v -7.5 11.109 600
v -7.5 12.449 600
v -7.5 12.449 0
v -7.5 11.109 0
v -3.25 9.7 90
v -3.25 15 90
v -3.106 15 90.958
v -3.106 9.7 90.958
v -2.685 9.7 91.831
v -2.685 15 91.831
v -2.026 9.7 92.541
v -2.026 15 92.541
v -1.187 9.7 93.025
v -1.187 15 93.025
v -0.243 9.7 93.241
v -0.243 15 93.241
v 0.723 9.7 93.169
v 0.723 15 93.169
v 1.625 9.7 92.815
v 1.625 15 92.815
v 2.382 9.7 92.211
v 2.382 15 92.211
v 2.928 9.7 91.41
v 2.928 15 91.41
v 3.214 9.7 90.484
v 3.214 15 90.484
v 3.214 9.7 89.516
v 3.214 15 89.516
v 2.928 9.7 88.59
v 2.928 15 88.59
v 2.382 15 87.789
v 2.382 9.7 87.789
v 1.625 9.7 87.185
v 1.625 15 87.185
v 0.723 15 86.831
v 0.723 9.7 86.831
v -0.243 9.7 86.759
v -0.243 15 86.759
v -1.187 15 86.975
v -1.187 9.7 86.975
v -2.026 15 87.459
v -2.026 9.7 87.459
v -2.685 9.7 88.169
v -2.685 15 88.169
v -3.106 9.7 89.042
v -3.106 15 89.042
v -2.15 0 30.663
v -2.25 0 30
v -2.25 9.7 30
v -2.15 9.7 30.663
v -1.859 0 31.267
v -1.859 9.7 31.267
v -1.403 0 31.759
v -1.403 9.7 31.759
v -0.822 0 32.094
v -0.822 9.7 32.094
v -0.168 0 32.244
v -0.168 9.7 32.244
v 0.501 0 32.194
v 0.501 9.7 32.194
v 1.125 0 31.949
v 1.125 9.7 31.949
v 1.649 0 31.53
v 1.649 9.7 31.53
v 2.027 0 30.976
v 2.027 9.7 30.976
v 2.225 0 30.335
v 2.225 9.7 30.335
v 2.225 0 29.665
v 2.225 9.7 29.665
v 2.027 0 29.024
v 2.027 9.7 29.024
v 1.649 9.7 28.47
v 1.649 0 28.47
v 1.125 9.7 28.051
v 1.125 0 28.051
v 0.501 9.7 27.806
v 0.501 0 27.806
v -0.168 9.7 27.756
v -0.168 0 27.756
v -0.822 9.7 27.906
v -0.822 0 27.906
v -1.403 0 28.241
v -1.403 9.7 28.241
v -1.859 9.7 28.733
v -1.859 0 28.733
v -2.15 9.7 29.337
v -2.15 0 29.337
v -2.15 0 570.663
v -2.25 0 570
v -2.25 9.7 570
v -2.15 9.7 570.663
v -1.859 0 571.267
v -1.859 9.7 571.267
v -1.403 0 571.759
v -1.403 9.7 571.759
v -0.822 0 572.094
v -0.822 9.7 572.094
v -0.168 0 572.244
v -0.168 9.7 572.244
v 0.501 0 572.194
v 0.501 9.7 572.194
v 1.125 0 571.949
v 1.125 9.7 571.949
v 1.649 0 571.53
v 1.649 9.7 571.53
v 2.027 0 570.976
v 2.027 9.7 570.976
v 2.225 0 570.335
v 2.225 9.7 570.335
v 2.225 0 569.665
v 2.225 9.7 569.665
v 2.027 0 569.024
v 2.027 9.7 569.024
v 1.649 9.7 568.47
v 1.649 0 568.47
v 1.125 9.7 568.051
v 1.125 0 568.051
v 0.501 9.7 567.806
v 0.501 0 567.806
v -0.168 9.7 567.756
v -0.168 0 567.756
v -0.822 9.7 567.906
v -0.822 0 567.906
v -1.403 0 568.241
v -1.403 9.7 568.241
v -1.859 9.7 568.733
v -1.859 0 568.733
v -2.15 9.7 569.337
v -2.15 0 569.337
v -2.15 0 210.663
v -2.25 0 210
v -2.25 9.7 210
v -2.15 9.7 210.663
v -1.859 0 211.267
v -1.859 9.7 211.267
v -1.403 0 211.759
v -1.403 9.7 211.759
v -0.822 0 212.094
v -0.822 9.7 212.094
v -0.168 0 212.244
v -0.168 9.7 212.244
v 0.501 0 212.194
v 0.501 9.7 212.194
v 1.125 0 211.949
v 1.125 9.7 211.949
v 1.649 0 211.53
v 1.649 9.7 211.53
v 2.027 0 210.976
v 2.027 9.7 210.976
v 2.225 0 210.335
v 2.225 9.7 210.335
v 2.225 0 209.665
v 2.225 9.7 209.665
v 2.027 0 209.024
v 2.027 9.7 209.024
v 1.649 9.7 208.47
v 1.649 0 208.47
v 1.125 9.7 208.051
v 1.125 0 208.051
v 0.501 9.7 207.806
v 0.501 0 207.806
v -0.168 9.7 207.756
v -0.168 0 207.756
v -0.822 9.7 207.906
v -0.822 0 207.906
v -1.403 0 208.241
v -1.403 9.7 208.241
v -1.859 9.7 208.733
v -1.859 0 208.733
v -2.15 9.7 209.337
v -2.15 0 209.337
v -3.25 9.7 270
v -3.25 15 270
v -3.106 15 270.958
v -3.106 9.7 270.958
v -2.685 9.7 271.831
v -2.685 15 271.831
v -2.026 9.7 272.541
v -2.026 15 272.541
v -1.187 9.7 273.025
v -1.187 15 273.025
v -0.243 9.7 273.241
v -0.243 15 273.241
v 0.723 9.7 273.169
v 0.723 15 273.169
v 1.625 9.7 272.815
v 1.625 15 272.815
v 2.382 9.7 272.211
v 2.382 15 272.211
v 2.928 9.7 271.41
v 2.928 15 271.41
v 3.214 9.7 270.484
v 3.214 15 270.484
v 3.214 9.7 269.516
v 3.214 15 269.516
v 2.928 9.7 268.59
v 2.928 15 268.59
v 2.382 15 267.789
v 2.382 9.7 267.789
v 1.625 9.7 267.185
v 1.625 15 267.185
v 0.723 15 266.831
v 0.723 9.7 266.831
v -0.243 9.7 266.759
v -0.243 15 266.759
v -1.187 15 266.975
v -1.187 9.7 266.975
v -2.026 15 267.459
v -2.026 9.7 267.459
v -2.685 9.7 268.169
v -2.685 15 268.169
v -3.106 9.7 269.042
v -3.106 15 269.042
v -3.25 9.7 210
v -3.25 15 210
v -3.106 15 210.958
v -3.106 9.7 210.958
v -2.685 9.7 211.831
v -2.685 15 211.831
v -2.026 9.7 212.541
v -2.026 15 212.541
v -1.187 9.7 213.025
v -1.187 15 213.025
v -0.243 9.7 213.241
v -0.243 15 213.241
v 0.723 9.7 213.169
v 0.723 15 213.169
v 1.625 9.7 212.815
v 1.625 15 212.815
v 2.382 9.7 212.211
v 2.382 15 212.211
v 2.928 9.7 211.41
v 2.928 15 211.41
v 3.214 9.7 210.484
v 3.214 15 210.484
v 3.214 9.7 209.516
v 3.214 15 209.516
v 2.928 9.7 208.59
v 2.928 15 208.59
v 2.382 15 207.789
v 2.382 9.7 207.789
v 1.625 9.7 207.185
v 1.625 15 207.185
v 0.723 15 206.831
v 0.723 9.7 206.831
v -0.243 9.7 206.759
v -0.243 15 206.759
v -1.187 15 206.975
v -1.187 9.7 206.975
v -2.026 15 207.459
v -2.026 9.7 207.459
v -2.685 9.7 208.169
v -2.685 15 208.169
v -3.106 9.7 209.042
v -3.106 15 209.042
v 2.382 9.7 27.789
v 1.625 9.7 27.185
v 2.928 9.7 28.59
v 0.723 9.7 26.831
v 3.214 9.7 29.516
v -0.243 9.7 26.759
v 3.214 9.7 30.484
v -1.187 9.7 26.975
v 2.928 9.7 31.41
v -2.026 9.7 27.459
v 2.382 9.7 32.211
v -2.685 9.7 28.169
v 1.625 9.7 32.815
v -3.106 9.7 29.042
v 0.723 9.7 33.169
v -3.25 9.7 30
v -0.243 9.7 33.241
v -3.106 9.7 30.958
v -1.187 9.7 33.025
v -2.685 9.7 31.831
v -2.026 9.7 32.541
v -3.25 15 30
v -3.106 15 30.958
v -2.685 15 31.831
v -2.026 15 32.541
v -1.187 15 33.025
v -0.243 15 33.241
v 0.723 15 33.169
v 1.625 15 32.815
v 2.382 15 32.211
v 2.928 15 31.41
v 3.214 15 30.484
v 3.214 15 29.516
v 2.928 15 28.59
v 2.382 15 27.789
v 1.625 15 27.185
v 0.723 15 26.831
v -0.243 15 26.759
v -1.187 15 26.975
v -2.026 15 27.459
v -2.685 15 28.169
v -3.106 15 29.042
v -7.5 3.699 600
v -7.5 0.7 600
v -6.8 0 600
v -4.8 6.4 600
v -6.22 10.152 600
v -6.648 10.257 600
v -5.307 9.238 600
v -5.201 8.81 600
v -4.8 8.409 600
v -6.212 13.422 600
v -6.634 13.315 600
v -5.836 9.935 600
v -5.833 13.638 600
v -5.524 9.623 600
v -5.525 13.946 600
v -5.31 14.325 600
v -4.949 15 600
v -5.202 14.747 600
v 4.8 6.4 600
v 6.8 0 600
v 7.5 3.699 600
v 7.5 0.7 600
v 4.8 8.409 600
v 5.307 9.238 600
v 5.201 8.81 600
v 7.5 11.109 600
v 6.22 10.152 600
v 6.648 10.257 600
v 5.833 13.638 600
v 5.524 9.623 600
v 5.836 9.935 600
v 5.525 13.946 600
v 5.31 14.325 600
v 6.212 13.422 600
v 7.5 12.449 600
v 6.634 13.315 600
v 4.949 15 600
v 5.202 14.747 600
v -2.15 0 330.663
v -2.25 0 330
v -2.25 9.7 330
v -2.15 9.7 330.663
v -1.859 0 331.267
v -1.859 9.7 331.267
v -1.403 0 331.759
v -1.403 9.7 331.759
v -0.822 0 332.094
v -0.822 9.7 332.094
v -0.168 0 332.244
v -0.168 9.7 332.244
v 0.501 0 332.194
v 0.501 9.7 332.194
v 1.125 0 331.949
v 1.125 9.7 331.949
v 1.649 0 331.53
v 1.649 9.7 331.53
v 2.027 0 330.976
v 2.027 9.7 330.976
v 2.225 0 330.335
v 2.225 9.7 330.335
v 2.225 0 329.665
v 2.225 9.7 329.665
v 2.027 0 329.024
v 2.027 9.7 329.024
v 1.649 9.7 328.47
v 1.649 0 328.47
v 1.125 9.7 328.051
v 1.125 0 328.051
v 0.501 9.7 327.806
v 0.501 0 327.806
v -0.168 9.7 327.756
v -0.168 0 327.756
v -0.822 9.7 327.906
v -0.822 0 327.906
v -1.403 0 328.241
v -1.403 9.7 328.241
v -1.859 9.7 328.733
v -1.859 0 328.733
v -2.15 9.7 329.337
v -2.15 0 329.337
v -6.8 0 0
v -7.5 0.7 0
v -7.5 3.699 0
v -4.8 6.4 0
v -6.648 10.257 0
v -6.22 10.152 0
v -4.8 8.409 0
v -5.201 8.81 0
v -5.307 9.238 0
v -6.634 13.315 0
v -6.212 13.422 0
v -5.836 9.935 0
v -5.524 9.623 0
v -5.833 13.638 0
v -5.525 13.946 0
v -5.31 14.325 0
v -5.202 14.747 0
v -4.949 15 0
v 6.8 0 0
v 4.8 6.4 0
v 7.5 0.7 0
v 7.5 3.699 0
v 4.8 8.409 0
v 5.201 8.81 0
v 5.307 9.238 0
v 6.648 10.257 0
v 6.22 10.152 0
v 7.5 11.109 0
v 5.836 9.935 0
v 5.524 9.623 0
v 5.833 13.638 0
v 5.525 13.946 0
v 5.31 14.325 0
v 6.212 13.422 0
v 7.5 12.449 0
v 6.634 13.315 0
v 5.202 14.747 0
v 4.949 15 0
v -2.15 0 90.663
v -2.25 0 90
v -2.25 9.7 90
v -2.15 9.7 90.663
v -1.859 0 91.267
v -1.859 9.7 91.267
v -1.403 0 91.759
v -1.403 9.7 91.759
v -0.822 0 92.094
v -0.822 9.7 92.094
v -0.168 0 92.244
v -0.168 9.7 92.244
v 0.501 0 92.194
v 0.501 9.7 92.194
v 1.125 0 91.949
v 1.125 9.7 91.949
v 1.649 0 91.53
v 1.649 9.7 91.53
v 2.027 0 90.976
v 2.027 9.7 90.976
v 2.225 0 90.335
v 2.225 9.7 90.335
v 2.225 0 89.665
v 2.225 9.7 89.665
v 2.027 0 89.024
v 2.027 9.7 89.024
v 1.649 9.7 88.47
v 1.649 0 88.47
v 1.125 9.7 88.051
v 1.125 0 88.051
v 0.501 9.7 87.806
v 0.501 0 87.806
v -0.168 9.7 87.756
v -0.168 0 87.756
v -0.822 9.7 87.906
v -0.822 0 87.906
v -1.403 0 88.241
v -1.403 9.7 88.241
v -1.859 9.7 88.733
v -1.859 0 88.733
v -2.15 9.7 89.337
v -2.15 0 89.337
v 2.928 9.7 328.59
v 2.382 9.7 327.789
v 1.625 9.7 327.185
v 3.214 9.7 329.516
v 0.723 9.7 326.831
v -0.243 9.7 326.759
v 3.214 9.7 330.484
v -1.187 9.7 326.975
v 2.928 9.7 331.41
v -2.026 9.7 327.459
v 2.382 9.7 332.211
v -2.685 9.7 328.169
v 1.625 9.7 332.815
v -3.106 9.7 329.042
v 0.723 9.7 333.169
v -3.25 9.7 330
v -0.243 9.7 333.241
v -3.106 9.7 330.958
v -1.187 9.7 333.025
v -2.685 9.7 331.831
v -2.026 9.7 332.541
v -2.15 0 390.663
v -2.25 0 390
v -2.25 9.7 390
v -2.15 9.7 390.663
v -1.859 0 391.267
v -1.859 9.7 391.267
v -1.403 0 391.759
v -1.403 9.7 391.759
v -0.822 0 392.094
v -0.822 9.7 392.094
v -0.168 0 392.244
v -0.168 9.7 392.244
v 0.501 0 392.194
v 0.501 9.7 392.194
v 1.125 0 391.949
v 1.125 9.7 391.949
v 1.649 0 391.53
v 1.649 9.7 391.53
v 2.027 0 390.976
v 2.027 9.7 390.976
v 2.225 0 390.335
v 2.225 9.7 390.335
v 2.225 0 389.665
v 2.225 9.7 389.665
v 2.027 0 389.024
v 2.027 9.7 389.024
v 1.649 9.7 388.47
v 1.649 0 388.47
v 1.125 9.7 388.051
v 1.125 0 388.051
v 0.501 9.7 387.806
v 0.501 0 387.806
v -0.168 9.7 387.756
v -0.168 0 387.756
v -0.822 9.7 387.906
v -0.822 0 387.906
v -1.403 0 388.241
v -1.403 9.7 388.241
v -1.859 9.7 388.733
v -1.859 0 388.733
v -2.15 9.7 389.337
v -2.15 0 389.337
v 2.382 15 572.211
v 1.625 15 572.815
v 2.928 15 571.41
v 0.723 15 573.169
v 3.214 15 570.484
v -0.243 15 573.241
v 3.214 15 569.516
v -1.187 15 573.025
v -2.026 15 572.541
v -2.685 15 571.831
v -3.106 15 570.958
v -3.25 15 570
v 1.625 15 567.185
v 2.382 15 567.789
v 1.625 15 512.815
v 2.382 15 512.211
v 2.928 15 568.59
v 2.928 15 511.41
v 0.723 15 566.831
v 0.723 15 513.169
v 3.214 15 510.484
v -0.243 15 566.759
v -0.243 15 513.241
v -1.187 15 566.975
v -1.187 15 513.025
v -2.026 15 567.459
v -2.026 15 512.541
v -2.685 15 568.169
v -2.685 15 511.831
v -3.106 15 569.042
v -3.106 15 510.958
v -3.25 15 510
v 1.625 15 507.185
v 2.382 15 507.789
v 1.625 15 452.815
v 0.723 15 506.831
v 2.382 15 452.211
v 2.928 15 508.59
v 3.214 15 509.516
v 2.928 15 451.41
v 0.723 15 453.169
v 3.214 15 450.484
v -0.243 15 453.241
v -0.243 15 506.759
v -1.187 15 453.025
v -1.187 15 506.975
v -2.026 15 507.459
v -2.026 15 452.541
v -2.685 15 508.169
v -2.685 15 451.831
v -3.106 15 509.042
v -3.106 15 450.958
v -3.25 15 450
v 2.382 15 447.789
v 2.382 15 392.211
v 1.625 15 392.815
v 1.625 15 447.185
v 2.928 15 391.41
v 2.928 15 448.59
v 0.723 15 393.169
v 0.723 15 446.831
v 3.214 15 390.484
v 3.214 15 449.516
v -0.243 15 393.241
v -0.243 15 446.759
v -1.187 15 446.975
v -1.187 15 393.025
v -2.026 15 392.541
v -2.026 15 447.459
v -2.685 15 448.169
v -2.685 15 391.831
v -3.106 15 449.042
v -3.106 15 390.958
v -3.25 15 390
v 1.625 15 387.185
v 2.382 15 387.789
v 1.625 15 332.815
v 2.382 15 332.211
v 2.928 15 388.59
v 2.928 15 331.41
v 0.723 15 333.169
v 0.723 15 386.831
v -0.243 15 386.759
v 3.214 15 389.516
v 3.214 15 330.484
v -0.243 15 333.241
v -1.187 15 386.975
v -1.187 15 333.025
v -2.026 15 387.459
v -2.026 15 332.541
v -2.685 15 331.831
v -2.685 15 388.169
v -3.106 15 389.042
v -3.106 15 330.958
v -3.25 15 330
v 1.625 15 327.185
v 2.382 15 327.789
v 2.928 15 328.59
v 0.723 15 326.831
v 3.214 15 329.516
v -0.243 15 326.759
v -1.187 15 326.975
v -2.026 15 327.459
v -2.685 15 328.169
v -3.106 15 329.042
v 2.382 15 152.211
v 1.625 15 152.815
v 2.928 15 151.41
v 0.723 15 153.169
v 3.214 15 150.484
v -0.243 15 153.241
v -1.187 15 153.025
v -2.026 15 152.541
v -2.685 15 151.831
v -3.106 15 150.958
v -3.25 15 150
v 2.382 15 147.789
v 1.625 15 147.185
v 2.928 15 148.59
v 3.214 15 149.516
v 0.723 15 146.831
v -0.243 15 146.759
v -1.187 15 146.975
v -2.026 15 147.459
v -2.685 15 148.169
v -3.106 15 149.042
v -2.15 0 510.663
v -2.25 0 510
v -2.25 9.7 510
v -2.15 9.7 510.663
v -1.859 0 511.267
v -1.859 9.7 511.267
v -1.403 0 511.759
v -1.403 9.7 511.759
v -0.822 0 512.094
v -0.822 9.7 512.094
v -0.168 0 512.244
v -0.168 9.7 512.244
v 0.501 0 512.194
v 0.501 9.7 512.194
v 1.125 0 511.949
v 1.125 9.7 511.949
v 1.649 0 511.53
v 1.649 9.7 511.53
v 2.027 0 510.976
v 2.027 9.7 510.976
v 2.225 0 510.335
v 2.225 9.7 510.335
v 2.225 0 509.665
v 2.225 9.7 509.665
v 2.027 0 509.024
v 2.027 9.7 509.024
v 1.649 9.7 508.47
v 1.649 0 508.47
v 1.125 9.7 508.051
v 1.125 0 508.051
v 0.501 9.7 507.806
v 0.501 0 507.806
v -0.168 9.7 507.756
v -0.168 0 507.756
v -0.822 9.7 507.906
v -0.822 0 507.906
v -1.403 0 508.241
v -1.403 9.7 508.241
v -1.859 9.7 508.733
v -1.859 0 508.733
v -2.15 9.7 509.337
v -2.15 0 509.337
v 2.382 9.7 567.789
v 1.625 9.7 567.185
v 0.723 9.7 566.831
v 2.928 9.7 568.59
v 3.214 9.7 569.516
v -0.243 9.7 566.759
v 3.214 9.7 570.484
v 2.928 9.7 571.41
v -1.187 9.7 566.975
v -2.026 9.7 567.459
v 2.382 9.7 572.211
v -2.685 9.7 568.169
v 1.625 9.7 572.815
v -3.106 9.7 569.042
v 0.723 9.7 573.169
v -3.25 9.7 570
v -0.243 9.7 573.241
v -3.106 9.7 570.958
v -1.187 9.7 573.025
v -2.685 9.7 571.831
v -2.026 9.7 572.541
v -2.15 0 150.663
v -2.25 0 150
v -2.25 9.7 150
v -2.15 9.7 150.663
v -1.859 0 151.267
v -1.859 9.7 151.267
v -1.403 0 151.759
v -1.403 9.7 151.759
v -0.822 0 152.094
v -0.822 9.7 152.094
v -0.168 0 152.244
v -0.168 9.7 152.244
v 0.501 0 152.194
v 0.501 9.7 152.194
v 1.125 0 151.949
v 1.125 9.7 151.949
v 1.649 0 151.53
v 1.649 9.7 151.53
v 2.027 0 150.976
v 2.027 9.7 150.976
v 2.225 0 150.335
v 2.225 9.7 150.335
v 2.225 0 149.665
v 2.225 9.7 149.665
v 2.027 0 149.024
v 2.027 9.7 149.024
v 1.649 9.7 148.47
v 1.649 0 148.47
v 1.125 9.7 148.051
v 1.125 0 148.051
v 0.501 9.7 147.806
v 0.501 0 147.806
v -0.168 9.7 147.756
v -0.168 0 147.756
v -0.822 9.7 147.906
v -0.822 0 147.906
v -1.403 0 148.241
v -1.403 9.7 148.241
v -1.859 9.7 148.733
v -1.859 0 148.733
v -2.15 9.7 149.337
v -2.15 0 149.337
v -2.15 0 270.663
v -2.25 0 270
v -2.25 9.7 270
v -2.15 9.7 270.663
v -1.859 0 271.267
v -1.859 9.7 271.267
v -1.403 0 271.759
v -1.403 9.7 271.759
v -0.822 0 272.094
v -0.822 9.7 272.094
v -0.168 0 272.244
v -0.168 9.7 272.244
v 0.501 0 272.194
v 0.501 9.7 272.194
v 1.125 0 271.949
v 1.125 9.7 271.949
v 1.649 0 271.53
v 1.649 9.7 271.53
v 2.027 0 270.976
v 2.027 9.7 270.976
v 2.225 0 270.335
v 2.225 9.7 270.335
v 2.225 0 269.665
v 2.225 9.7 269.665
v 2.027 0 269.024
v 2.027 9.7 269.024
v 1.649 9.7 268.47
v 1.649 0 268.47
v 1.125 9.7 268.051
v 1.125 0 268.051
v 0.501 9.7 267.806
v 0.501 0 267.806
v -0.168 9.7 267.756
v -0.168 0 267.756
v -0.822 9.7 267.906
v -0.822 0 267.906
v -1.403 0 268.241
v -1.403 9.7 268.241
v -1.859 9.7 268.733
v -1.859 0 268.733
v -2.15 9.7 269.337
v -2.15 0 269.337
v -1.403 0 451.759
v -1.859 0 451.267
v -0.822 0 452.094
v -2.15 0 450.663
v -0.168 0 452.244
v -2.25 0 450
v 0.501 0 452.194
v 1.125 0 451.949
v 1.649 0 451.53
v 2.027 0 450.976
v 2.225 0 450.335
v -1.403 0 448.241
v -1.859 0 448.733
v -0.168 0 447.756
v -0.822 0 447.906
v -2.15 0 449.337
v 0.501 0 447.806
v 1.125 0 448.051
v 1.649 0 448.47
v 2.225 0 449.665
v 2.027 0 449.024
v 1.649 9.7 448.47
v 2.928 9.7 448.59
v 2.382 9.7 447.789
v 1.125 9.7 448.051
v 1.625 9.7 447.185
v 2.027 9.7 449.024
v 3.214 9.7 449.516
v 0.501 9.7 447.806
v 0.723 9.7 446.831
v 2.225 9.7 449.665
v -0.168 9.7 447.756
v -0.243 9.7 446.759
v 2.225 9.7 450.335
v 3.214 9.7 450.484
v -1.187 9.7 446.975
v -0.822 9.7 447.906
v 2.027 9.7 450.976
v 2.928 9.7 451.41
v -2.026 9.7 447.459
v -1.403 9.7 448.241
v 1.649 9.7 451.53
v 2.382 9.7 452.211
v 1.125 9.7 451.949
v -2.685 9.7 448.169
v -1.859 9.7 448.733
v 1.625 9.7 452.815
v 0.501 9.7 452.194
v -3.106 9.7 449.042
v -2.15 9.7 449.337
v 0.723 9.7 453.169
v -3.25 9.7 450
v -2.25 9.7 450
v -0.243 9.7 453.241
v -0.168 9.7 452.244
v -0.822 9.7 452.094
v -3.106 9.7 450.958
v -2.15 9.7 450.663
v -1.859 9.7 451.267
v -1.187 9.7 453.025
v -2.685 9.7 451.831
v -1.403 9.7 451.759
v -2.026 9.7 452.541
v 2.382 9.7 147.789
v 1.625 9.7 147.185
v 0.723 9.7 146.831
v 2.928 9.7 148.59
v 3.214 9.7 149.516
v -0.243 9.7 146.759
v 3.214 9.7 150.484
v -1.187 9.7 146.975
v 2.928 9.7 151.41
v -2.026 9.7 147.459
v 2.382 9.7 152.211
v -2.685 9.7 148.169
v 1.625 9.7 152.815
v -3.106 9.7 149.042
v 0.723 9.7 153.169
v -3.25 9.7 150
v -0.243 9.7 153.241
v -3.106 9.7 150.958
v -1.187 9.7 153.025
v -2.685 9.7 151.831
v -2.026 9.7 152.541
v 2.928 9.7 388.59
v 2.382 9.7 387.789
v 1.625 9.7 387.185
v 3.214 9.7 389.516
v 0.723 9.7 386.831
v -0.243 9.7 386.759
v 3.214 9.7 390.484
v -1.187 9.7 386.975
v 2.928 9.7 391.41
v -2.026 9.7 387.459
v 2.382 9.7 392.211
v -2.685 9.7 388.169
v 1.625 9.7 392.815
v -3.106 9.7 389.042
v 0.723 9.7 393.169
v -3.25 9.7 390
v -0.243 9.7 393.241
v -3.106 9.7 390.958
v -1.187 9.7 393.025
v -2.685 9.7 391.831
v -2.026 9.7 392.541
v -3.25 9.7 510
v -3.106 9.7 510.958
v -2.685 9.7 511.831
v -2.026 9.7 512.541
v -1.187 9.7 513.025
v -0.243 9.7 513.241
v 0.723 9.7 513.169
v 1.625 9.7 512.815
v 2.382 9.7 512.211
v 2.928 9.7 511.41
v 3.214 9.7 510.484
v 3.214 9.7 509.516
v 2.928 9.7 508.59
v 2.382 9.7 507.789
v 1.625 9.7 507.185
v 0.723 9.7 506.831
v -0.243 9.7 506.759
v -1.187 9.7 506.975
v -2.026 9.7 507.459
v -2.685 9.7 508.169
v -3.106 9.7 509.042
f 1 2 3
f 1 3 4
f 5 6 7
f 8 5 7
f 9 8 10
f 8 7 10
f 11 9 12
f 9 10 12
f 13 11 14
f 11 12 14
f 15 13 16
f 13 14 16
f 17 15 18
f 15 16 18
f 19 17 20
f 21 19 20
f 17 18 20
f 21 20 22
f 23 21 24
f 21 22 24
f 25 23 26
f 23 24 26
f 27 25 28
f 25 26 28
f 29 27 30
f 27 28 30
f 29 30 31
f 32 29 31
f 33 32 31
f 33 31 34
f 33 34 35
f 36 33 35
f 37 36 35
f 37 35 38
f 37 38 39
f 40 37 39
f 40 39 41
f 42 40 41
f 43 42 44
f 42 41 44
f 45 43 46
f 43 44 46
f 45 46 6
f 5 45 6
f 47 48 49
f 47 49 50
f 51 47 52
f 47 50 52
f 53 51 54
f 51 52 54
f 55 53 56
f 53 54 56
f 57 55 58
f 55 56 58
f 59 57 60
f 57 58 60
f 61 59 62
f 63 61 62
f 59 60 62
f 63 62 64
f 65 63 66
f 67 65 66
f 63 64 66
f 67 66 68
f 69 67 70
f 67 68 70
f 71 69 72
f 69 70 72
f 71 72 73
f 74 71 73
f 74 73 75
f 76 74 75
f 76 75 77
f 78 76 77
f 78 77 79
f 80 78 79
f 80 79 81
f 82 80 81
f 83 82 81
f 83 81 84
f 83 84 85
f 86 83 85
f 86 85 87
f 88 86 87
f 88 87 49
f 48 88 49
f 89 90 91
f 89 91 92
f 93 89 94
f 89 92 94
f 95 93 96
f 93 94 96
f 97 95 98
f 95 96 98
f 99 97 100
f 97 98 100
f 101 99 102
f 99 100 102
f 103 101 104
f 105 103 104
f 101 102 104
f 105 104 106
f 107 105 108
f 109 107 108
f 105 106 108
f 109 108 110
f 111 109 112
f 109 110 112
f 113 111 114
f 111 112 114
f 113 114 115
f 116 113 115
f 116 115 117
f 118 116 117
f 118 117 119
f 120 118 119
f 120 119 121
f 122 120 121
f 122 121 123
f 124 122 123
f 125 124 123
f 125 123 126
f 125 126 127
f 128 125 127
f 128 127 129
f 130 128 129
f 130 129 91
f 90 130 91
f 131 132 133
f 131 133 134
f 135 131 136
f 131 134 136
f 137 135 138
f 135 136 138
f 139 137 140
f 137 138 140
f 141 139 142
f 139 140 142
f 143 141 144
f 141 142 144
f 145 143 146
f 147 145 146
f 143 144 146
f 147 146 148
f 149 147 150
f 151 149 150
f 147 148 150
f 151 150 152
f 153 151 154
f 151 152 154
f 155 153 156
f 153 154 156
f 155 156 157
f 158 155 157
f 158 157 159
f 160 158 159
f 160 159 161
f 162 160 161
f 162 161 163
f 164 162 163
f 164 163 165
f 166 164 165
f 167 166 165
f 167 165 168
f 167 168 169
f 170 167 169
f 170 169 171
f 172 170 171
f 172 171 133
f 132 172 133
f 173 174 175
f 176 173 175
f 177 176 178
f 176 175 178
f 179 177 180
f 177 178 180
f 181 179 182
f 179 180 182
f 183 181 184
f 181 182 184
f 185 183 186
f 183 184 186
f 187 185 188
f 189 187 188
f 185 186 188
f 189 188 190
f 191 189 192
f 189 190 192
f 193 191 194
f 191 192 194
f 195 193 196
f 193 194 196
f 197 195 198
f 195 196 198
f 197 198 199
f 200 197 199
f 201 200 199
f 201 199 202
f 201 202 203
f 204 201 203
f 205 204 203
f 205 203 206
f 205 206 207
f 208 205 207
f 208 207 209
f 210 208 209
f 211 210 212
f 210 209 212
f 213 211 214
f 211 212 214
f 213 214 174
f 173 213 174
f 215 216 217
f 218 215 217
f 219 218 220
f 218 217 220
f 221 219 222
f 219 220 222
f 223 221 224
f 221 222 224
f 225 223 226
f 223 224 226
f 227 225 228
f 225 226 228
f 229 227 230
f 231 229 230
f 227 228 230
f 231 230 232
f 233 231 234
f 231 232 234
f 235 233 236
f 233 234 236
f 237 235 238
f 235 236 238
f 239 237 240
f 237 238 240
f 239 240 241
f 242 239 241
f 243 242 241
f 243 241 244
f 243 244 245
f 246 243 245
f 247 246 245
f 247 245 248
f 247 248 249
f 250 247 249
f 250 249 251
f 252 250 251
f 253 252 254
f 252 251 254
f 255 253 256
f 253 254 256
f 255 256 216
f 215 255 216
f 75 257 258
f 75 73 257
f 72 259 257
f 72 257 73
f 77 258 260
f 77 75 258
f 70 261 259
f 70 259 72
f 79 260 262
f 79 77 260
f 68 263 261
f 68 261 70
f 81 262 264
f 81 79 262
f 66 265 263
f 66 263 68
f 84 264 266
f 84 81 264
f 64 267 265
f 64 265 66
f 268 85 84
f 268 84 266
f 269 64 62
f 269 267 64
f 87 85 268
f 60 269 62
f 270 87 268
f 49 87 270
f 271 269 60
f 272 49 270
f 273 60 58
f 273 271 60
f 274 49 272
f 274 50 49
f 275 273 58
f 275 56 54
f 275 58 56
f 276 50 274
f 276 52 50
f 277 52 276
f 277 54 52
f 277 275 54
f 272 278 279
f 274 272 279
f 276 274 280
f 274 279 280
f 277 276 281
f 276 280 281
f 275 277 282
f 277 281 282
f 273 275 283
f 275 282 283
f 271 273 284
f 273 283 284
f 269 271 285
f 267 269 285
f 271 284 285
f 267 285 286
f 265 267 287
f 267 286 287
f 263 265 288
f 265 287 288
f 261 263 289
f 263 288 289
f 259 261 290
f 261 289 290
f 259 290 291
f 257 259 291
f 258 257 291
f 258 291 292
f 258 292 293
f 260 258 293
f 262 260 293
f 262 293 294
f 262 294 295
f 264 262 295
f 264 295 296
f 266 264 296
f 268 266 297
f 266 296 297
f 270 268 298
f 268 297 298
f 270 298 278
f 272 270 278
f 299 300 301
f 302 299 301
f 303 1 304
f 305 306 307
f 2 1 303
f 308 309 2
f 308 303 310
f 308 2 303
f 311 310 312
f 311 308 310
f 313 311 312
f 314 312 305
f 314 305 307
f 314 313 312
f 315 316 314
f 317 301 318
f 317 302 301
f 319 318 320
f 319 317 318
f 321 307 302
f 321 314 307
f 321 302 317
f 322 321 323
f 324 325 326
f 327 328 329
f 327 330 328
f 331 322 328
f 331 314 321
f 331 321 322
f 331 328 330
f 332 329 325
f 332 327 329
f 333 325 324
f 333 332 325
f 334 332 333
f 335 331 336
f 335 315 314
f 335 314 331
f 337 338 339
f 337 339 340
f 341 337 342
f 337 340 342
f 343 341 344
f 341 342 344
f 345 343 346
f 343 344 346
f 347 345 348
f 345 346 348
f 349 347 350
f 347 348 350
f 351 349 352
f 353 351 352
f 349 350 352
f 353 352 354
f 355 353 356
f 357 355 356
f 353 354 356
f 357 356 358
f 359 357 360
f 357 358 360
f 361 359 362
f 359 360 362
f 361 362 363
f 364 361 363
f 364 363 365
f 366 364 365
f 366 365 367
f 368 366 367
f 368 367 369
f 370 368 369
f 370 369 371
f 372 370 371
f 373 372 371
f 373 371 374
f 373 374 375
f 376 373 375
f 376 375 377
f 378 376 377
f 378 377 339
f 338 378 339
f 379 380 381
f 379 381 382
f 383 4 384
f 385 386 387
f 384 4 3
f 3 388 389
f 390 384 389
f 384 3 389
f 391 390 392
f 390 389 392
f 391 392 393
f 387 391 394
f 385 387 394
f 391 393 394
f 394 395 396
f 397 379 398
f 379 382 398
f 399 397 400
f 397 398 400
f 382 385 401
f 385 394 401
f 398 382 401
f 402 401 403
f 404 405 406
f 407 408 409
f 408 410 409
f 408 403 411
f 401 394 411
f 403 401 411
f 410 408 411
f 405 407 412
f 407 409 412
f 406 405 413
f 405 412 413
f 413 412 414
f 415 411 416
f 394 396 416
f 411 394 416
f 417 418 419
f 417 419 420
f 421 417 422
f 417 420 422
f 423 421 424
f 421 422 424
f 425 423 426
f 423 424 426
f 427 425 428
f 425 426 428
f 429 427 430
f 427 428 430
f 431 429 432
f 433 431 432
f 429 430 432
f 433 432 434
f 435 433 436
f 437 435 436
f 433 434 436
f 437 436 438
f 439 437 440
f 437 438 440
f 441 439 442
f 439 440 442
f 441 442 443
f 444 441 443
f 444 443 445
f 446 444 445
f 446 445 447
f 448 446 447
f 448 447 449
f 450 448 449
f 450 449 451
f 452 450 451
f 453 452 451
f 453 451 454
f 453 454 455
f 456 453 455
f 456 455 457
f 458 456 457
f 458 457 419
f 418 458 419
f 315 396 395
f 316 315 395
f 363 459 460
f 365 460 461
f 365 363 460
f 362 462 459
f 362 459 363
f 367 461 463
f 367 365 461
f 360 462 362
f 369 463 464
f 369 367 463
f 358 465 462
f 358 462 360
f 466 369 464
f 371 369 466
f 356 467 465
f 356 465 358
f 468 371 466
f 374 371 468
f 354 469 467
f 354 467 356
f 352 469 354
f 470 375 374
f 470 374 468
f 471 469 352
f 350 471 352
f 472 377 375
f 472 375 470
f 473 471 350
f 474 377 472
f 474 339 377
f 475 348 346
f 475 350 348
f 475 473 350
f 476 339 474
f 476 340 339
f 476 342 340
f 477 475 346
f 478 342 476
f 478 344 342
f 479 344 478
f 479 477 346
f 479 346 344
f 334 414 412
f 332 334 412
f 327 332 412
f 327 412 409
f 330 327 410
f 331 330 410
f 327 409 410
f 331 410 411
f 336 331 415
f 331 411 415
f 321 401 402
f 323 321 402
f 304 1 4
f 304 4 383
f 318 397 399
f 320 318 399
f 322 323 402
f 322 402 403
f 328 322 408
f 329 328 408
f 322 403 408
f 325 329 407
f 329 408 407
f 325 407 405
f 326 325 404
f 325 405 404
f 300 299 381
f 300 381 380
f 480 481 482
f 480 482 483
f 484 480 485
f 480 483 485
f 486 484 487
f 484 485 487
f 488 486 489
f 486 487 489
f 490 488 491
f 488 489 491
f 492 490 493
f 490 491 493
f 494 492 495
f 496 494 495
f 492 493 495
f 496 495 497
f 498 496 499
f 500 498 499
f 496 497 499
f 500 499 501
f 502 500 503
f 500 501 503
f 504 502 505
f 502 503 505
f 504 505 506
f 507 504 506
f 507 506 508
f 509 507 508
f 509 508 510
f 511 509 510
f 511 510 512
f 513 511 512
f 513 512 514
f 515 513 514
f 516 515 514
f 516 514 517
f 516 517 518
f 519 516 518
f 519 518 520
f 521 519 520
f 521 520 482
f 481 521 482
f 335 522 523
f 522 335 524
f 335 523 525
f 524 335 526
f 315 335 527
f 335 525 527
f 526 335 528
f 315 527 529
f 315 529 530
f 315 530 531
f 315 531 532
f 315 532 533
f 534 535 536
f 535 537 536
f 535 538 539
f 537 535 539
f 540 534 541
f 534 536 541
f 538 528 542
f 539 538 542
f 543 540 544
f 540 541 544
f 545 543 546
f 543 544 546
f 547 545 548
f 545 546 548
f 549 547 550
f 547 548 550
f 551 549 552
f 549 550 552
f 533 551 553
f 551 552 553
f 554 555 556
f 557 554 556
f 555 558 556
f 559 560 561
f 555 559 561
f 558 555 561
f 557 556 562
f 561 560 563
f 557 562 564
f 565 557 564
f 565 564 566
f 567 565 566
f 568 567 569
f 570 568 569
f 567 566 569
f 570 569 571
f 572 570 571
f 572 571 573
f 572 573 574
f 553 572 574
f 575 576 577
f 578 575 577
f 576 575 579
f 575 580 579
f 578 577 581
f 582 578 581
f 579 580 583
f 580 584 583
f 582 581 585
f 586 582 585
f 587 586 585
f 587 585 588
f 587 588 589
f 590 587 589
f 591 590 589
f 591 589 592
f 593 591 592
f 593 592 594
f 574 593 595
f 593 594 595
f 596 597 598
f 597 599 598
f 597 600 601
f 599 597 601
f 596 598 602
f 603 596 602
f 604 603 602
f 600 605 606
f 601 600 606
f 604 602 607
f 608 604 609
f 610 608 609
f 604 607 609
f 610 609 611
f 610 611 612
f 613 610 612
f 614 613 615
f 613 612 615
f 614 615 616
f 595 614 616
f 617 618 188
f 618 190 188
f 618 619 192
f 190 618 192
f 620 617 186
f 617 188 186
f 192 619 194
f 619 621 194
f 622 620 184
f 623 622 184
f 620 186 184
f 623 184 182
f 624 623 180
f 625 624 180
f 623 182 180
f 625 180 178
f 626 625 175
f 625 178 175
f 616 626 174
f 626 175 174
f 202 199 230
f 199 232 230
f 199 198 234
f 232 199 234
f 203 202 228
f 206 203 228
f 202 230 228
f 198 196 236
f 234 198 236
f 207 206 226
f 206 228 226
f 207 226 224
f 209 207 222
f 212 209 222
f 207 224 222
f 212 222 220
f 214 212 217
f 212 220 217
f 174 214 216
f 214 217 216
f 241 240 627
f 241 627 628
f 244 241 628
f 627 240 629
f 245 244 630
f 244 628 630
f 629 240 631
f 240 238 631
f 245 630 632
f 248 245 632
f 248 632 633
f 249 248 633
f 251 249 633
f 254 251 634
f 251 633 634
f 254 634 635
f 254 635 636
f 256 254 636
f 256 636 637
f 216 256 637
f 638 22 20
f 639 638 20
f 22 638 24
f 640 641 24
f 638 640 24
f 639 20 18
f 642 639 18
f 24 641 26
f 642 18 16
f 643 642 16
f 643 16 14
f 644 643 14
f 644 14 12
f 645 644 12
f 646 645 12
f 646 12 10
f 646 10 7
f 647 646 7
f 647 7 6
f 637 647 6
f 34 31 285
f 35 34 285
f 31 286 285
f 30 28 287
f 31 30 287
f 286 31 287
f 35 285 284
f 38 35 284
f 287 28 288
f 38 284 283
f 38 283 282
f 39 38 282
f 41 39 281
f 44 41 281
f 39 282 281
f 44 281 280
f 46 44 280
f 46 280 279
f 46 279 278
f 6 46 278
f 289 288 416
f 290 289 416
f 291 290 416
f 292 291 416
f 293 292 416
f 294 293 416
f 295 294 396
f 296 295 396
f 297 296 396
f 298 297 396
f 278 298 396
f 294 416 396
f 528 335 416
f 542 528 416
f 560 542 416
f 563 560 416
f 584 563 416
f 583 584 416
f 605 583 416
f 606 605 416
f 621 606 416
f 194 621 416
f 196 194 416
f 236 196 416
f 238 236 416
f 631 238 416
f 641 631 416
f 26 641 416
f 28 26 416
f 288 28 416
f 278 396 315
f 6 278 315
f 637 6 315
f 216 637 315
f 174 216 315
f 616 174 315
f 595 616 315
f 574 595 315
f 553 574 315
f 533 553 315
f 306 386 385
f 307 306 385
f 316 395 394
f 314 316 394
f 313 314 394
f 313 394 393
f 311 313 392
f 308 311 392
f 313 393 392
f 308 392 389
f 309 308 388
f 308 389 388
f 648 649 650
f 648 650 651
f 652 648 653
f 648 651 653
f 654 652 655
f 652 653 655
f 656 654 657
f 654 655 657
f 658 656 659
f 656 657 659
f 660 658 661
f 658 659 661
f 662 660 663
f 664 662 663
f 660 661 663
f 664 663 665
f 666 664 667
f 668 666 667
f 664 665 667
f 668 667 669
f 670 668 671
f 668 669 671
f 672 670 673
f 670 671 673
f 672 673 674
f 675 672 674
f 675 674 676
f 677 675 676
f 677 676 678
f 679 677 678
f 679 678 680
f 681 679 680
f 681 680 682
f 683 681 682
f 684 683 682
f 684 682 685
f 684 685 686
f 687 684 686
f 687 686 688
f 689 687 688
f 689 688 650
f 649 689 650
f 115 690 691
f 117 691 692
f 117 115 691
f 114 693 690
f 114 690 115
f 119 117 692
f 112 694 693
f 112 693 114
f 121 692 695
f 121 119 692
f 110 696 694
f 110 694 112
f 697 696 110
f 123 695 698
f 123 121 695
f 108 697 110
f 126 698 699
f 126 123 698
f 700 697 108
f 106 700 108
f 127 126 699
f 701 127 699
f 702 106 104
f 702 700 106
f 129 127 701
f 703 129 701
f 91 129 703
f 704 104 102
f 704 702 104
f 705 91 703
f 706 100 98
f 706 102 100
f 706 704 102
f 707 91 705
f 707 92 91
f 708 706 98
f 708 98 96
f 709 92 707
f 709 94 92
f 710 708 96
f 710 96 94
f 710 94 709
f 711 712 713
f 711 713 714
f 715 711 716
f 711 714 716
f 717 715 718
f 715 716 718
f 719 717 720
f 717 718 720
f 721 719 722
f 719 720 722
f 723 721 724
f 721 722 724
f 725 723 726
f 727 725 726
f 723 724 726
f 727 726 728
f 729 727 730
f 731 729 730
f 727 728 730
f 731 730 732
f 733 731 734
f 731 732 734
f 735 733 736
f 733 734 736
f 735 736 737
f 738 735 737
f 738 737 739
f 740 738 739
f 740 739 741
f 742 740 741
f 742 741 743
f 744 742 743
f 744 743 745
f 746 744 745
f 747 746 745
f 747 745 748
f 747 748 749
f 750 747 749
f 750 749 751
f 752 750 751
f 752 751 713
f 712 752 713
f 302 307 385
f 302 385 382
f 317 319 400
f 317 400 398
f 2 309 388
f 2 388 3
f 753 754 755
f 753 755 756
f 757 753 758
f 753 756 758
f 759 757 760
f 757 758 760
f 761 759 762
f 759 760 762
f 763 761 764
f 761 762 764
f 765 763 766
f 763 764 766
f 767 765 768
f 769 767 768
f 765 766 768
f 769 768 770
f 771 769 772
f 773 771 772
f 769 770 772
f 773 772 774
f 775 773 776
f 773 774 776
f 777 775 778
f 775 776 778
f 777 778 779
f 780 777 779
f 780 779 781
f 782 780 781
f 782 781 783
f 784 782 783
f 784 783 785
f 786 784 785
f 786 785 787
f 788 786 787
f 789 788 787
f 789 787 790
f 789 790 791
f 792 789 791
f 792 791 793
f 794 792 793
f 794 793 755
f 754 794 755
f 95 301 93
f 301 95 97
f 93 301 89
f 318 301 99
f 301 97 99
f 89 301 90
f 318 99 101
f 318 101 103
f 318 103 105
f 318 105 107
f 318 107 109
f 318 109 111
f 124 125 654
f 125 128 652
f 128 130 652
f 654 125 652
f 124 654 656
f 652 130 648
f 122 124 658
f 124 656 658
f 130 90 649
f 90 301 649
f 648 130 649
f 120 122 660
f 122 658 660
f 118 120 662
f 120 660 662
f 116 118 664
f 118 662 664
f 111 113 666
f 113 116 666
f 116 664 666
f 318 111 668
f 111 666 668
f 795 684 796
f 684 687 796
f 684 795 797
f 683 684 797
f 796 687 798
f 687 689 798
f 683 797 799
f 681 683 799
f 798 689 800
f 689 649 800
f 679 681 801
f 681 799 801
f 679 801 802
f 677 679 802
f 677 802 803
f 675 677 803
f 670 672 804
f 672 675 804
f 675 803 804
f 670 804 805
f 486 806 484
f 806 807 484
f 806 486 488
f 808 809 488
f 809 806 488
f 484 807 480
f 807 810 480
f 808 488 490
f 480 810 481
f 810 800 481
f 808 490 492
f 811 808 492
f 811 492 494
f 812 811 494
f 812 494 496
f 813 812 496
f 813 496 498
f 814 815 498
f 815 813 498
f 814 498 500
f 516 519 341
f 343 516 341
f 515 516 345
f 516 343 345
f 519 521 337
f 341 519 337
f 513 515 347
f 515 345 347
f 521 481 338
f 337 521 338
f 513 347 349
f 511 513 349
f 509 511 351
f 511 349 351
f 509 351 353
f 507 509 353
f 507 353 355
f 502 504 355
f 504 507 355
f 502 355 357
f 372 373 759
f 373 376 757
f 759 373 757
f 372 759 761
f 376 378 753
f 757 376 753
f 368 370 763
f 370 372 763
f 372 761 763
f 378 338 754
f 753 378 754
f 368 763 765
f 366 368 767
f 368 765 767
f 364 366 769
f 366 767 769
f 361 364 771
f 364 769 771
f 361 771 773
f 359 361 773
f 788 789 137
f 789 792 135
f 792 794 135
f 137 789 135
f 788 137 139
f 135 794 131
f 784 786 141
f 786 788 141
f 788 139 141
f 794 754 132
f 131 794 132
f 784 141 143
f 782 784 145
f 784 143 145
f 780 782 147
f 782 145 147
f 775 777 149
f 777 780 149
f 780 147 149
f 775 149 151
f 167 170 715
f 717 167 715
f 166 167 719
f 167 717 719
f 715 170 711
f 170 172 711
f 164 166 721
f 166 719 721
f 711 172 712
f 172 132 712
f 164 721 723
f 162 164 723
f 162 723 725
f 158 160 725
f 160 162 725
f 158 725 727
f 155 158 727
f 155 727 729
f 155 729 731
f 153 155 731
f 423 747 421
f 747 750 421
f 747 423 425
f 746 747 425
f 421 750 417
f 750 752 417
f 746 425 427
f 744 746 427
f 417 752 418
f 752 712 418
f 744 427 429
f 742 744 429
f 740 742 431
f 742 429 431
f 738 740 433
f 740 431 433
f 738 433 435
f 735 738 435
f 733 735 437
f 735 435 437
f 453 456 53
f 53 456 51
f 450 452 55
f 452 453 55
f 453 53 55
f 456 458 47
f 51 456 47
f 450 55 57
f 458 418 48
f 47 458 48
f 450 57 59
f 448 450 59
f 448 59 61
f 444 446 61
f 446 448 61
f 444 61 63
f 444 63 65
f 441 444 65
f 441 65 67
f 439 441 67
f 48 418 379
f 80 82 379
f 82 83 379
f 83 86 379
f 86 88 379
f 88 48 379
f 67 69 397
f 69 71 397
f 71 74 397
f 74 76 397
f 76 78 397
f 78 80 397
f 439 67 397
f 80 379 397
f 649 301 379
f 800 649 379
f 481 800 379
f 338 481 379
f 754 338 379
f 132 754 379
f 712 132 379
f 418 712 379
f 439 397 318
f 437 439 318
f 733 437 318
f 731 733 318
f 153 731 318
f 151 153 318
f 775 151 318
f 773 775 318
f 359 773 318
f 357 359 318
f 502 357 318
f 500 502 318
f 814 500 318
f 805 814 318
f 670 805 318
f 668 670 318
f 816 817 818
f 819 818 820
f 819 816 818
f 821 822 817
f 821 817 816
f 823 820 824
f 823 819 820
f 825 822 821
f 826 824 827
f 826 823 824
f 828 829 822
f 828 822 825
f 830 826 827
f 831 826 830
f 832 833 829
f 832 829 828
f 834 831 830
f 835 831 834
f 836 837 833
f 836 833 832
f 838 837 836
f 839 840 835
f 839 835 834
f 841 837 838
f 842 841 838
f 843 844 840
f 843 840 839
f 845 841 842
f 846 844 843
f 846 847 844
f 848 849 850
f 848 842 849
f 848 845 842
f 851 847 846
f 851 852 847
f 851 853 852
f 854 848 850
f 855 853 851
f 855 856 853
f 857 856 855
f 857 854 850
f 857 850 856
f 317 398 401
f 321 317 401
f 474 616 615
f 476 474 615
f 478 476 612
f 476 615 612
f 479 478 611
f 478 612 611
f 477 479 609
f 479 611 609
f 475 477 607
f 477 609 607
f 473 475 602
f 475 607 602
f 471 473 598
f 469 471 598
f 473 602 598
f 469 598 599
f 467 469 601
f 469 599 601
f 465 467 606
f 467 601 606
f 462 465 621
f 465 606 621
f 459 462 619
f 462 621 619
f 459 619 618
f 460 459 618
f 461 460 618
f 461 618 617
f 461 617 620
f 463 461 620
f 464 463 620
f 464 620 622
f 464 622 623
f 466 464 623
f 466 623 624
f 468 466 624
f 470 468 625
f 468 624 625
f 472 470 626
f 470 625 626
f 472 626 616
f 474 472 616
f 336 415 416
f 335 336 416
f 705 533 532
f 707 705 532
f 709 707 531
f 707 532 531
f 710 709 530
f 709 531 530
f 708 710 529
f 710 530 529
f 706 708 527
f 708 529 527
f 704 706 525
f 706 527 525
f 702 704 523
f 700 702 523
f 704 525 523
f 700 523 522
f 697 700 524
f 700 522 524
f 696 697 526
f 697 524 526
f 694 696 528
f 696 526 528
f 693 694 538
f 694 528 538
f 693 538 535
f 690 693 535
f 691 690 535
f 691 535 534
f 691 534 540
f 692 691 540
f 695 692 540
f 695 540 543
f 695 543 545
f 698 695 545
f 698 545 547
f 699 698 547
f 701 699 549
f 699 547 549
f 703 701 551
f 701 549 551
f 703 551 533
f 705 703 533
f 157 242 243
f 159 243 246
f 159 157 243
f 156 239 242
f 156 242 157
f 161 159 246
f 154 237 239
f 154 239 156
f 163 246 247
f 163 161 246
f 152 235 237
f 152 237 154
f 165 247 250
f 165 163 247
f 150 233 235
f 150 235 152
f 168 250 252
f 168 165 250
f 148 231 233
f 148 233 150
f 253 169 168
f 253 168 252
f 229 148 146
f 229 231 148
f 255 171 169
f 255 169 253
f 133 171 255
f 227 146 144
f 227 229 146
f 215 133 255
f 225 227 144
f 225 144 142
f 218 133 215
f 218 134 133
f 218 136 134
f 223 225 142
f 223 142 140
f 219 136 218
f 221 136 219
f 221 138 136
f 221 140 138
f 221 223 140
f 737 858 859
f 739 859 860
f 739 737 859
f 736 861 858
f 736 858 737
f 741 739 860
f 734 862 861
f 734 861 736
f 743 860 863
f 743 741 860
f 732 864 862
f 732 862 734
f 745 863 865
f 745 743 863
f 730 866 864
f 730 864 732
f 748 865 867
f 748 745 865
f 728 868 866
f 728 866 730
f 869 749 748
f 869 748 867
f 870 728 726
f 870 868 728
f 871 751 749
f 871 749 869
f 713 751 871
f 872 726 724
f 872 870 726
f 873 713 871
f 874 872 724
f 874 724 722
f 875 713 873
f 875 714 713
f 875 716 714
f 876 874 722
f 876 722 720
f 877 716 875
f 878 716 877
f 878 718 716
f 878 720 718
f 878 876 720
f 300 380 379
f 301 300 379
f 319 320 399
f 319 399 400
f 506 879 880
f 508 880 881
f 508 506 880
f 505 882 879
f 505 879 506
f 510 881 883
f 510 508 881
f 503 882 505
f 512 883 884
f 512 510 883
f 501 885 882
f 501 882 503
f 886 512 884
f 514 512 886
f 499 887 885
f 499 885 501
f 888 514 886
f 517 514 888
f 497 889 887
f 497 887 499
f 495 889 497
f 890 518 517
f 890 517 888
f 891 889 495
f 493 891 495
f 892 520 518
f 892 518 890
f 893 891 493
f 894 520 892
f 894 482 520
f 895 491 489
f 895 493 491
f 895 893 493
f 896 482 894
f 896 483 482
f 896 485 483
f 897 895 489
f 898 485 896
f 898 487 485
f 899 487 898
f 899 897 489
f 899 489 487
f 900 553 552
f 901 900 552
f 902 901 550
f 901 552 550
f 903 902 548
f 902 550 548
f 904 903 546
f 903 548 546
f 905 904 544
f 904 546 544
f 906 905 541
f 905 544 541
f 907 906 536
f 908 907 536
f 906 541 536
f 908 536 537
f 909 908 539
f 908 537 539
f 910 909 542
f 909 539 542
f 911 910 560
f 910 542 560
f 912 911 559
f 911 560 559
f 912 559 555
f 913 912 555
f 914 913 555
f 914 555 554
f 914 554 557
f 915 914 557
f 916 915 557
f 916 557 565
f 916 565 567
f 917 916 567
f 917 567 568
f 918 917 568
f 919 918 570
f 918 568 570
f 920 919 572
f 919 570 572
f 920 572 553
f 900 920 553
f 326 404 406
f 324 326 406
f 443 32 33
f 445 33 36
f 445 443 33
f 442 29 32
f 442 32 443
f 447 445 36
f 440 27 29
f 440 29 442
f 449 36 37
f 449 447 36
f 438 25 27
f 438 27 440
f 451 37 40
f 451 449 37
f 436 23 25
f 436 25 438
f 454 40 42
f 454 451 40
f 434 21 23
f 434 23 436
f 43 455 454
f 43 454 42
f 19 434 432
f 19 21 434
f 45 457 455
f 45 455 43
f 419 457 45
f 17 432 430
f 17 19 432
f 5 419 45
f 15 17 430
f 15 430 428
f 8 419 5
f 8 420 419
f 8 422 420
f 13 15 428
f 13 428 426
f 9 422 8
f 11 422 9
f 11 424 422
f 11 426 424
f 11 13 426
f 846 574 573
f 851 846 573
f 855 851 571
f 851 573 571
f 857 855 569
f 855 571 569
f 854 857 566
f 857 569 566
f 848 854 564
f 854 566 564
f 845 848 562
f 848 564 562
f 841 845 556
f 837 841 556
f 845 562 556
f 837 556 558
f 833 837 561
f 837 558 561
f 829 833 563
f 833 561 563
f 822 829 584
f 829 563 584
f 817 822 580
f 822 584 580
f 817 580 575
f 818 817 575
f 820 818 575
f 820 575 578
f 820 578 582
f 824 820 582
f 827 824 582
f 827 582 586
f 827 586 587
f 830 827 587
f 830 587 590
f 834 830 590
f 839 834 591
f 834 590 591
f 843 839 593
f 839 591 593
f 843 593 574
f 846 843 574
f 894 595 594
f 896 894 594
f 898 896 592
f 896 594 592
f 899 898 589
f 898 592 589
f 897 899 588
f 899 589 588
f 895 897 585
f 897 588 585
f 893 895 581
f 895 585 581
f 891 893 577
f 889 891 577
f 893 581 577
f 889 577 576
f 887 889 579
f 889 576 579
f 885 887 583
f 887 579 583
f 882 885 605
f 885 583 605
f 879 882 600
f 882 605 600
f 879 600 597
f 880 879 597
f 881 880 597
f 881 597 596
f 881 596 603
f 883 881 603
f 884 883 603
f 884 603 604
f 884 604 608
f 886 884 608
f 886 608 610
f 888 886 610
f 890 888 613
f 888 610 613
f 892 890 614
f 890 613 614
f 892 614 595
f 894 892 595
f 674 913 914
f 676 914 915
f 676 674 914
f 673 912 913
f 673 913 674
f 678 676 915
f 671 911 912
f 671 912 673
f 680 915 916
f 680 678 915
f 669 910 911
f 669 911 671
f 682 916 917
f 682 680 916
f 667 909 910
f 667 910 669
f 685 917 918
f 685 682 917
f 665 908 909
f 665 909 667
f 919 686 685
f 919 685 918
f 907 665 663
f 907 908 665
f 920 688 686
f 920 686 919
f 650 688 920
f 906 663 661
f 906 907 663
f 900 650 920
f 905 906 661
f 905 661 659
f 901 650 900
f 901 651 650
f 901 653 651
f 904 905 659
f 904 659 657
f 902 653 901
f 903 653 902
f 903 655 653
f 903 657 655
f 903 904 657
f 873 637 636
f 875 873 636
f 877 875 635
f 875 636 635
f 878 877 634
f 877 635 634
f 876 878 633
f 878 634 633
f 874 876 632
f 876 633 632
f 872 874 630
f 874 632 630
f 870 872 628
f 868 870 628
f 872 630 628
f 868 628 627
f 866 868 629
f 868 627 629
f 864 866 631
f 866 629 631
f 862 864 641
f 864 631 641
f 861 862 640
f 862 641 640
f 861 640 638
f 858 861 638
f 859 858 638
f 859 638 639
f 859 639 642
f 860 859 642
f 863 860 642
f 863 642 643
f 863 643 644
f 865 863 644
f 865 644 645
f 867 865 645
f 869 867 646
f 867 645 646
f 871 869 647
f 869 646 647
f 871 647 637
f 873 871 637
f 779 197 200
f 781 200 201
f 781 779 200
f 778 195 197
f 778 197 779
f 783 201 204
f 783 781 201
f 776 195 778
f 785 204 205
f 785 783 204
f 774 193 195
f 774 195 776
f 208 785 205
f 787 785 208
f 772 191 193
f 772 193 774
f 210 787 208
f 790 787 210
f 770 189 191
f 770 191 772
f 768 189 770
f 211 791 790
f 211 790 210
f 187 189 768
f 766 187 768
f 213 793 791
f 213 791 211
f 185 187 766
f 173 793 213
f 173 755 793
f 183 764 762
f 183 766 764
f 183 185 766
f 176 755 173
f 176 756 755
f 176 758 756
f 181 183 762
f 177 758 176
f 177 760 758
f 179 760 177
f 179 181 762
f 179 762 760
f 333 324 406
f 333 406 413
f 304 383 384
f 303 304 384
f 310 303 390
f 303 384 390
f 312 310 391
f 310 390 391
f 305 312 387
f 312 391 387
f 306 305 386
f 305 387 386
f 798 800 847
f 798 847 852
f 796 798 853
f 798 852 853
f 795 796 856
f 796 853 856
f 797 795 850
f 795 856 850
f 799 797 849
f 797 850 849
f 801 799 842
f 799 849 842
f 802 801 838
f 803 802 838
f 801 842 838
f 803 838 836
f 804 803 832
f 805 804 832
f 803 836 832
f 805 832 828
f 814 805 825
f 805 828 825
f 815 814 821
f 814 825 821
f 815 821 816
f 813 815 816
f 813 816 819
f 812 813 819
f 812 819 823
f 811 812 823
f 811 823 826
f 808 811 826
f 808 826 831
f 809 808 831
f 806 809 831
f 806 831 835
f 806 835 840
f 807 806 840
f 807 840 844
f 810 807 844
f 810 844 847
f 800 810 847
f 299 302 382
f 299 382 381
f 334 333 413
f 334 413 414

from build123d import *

# Parameters (mm, degrees)
EXTRUDE_1_DEPTH     = 600
SKETCH_2_R          = 3.25
CUT_EXTRUDE_1_DEPTH = 5.3
SKETCH_3_R          = 2.25
CUT_EXTRUDE_2_DEPTH = 601.125270256


with BuildPart() as part:
    # Model → Бобышка-Вытянуть1 (new body)
    with BuildSketch(Plane.XY):
        with BuildLine():
            Line((6.8, 0), (7.5, 0.7))
            Line((7.5, 0.7), (7.5, 3.6994391))
            Line((7.5, 3.6994391), (4.7998047, 6.3996344))
            Line((4.7998047, 6.3996344), (4.7998047, 8.409149262))
            Line((4.7998047, 8.409149262), (5.20075838, 8.810103152))
            ThreePointArc((5.20075838, 8.810103152), (5.668922208, 9.789261508), (6.648080611, 10.257425237))
            Line((6.648080611, 10.257425237), (7.5, 11.109345046))
            Line((7.5, 11.109345046), (7.5, 12.449454443))
            Line((7.5, 12.449454443), (6.634490912, 13.314965186))
            ThreePointArc((6.634490912, 13.314965186), (5.668922174, 13.781617126), (5.202270193, 14.747185846))
            Line((5.202270193, 14.747185846), (4.949456226, 15))
            Line((4.949456226, 15), (-4.949456226, 15))
            Line((-4.949456226, 15), (-5.202270193, 14.747185846))
            ThreePointArc((-5.202270193, 14.747185846), (-5.668922174, 13.781617126), (-6.634490912, 13.314965186))
            Line((-6.634490912, 13.314965186), (-7.5, 12.449454443))
            Line((-7.5, 12.449454443), (-7.5, 11.109345046))
            Line((-7.5, 11.109345046), (-6.648080611, 10.257425238))
            ThreePointArc((-6.648080611, 10.257425238), (-5.668922208, 9.789261508), (-5.20075838, 8.810103152))
            Line((-5.20075838, 8.810103152), (-4.7998047, 8.409149262))
            Line((-4.7998047, 8.409149262), (-4.7998047, 6.3996344))
            Line((-4.7998047, 6.3996344), (-7.5, 3.6994391))
            Line((-7.5, 3.6994391), (-7.5, 0.7))
            Line((-7.5, 0.7), (-6.8, 0))
            Line((-6.8, 0), (6.8, 0))
        make_face()
    extrude(amount=EXTRUDE_1_DEPTH)

    # Эскиз2 → Вырез-Вытянуть1 (cut)
    with BuildSketch(Plane(origin=(0, 15, 0), x_dir=(1, 0, 0), z_dir=(0, 1, 0))):
        with Locations(Location((0, -30, 0), (0, 0, 180))):
            Circle(SKETCH_2_R)
        with Locations(Location((0, -90, 0), (0, 0, 180))):
            Circle(SKETCH_2_R)
        with Locations(Location((0, -150, 0), (0, 0, 180))):
            Circle(SKETCH_2_R)
        with Locations(Location((0, -210, 0), (0, 0, 180))):
            Circle(SKETCH_2_R)
        with Locations(Location((0, -270, 0), (0, 0, 180))):
            Circle(SKETCH_2_R)
        with Locations(Location((0, -330, 0), (0, 0, 180))):
            Circle(SKETCH_2_R)
        with Locations(Location((0, -390, 0), (0, 0, 180))):
            Circle(SKETCH_2_R)
        with Locations(Location((0, -450, 0), (0, 0, 180))):
            Circle(SKETCH_2_R)
        with Locations(Location((0, -510, 0), (0, 0, 180))):
            Circle(SKETCH_2_R)
        with Locations(Location((0, -570, 0), (0, 0, 180))):
            Circle(SKETCH_2_R)
    extrude(amount=-CUT_EXTRUDE_1_DEPTH, mode=Mode.SUBTRACT)

    # Эскиз3 → Вырез-Вытянуть2 (cut, through all)
    with BuildSketch(Plane(origin=(0, 9.7, 0), x_dir=(1, 0, 0), z_dir=(0, 1, 0))):
        with Locations(Location((0, -30, 0), (0, 0, 180))):
            Circle(SKETCH_3_R)
        with Locations(Location((0, -90, 0), (0, 0, 180))):
            Circle(SKETCH_3_R)
        with Locations(Location((0, -150, 0), (0, 0, 180))):
            Circle(SKETCH_3_R)
        with Locations(Location((0, -210, 0), (0, 0, 180))):
            Circle(SKETCH_3_R)
        with Locations(Location((0, -270, 0), (0, 0, 180))):
            Circle(SKETCH_3_R)
        with Locations(Location((0, -330, 0), (0, 0, 180))):
            Circle(SKETCH_3_R)
        with Locations(Location((0, -390, 0), (0, 0, 180))):
            Circle(SKETCH_3_R)
        with Locations(Location((0, -450, 0), (0, 0, 180))):
            Circle(SKETCH_3_R)
        with Locations(Location((0, -510, 0), (0, 0, 180))):
            Circle(SKETCH_3_R)
        with Locations(Location((0, -570, 0), (0, 0, 180))):
            Circle(SKETCH_3_R)
    extrude(amount=-CUT_EXTRUDE_2_DEPTH, mode=Mode.SUBTRACT)


solid = part.part
